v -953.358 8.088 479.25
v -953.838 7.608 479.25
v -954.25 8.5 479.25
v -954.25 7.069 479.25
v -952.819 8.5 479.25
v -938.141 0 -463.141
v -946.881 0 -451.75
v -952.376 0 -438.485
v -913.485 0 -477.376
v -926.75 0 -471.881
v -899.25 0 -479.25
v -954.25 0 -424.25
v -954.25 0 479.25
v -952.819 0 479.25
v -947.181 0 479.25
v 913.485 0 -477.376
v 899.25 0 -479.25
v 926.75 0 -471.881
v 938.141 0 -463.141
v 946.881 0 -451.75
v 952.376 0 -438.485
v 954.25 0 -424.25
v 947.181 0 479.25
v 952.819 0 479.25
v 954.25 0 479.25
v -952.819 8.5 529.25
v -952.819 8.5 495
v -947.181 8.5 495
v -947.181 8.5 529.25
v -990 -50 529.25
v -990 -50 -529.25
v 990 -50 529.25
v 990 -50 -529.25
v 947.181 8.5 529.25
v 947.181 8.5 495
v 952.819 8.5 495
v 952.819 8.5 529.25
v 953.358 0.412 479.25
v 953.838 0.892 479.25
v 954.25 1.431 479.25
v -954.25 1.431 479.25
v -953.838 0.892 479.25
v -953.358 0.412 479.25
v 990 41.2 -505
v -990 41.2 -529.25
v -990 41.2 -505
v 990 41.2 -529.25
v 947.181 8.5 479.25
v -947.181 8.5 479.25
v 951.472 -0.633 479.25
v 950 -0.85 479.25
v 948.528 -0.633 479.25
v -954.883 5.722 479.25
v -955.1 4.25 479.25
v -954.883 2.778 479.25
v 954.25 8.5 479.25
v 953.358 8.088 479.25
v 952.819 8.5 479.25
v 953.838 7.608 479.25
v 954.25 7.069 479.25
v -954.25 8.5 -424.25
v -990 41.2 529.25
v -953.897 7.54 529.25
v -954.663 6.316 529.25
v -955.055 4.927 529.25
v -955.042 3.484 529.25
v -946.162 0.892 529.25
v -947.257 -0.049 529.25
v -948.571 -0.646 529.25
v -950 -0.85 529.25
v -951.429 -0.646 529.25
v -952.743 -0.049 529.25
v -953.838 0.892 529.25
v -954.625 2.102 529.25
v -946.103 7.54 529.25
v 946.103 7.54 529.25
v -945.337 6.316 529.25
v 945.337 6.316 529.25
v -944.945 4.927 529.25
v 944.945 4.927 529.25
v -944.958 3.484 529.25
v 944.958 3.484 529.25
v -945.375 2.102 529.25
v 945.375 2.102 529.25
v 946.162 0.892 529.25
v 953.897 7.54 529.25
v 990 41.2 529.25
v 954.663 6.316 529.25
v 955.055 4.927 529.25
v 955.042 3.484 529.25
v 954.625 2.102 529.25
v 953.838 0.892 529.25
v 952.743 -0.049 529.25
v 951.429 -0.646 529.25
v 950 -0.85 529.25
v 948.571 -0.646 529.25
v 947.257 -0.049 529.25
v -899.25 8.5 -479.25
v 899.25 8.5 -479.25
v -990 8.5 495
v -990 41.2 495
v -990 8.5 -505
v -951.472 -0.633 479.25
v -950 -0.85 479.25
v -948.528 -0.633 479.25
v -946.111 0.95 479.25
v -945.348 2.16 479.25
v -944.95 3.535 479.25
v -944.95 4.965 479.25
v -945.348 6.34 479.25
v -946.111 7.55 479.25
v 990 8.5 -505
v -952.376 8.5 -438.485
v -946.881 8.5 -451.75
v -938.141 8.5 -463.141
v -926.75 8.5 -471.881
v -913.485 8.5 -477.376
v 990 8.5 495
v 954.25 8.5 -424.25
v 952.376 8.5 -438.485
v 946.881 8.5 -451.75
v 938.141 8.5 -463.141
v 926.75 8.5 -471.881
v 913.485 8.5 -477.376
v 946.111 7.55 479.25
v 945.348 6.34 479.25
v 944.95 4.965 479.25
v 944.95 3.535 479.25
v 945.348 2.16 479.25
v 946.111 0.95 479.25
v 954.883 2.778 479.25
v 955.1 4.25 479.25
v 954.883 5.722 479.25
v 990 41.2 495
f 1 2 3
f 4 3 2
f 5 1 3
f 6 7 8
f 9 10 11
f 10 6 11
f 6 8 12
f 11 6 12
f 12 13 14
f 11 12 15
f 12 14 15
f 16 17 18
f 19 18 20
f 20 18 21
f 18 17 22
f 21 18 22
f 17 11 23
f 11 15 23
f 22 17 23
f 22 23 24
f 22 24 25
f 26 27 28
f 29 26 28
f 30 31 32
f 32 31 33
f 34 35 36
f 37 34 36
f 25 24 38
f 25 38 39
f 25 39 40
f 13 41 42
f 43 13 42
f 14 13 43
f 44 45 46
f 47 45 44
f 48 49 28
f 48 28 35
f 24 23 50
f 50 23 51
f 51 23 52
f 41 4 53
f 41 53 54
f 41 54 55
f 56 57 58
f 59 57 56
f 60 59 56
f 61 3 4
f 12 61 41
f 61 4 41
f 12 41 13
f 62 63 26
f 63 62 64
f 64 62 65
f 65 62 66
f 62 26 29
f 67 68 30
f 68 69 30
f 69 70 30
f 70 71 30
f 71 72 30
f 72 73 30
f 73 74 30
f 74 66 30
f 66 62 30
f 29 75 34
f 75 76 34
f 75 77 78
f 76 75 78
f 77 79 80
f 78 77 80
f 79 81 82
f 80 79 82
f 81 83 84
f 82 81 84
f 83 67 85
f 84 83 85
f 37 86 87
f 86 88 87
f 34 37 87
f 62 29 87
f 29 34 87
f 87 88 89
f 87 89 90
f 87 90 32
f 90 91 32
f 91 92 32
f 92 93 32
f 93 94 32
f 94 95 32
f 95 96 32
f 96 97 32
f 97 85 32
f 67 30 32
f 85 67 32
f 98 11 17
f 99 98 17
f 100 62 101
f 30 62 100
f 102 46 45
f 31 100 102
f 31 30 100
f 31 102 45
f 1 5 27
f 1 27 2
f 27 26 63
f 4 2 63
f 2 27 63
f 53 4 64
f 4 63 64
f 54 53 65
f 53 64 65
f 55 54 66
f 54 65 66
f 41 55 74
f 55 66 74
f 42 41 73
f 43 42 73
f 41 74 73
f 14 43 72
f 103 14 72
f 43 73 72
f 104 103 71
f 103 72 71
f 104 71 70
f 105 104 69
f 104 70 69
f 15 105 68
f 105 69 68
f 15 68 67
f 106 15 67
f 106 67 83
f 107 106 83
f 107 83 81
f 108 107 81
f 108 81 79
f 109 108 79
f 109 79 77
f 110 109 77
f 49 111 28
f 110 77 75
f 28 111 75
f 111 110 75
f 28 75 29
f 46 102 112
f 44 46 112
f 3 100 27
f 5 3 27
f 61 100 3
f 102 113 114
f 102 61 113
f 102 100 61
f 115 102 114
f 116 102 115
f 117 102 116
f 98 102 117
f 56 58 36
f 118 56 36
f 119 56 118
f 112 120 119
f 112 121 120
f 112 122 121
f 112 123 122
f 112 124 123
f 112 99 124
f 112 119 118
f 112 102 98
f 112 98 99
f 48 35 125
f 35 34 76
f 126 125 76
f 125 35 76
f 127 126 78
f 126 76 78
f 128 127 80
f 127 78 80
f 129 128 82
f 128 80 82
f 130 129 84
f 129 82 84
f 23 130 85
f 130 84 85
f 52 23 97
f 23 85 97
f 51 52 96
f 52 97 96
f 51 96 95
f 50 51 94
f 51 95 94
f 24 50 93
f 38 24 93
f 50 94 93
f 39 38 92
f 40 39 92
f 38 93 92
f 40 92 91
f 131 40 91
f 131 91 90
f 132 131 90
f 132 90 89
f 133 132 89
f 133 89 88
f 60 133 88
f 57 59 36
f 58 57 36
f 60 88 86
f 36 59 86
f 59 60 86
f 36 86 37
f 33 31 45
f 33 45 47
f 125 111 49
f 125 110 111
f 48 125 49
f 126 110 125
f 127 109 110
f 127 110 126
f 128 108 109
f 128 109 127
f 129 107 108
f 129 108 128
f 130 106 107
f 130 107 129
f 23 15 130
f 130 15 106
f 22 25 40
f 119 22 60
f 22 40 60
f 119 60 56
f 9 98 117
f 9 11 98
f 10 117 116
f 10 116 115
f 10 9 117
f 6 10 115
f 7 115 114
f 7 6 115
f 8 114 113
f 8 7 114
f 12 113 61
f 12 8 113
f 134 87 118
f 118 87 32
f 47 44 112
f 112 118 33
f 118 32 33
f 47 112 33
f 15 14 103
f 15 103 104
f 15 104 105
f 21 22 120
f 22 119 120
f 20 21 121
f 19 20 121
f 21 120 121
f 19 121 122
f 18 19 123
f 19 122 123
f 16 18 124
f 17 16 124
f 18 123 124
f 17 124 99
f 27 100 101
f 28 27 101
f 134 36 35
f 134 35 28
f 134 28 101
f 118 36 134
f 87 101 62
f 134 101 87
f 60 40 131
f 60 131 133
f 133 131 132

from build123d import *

# Parameters (mm, degrees)
BOSS_EXTRUDE1_DEPTH = 479.25
BOSS_EXTRUDE2_START = -50
SKETCH3_W           = 1980
SKETCH3_H           = 50
BOSS_EXTRUDE2_DEPTH = 58.5
FILLET1_R           = 55
BOSS_EXTRUDE4_START = -50
SKETCH4_W           = 1980
SKETCH4_H           = 50
BOSS_EXTRUDE4_DEPTH = 58.5
CUT_EXTRUDE1_START  = 529.25
SKETCH7_R           = 5.1
CUT_EXTRUDE1_DEPTH  = 50
BOSS_EXTRUDE5_START = 8.5
SKETCH8_W           = 1980
SKETCH8_H           = 24.25
SKETCH8_H_2         = 34.25
BOSS_EXTRUDE5_DEPTH = 32.7


with BuildPart() as part:
    # Sketch2 → Boss-Extrude1 (new, symmetric)
    with BuildSketch(Plane.XY):
        Polygon((-954.25, 0), (954.25, 0), (954.25, 8.5), (990, 8.5), (990, -50), (-990, -50), (-990, 8.5), (-954.25, 8.5), align=None)
    extrude(amount=BOSS_EXTRUDE1_DEPTH, both=True)

    # Sketch3 → Boss-Extrude2 (add)
    with BuildSketch(Plane(origin=(0, 0, 0), x_dir=(1, 0, 0), z_dir=(0, 1, 0)).offset(BOSS_EXTRUDE2_START)):
        with Locations((0, 504.25)):
            Rectangle(SKETCH3_W, SKETCH3_H)
    extrude(amount=BOSS_EXTRUDE2_DEPTH)

    # Fillet1
    fillet1_edges = [part.edges().sort_by_distance(p)[0] for p in [
        (954.25, 4.25, -479.25),
        (-954.25, 4.25, -479.25),
    ]]
    fillet(fillet1_edges, radius=FILLET1_R)

    # Sketch4 → Boss-Extrude4 (add)
    with BuildSketch(Plane(origin=(0, 0, 0), x_dir=(1, 0, 0), z_dir=(0, 1, 0)).offset(BOSS_EXTRUDE4_START)):
        with Locations((0, -504.25)):
            Rectangle(SKETCH4_W, SKETCH4_H)
    extrude(amount=BOSS_EXTRUDE4_DEPTH)

    # Sketch7 → Cut-Extrude1 (cut)
    with BuildSketch(Plane.XY.offset(CUT_EXTRUDE1_START)):
        with Locations((-950, 4.25)):
            Circle(SKETCH7_R)
        with Locations((950, 4.25)):
            Circle(SKETCH7_R)
    extrude(amount=-CUT_EXTRUDE1_DEPTH, mode=Mode.SUBTRACT)

    # Sketch8 → Boss-Extrude5 (add)
    with BuildSketch(Plane(origin=(0, 0, 0), x_dir=(1, 0, 0), z_dir=(0, 1, 0)).offset(BOSS_EXTRUDE5_START)):
        with Locations((0, 517.125)):
            Rectangle(SKETCH8_W, SKETCH8_H)
        with Locations((0, -512.125)):
            Rectangle(SKETCH8_W, SKETCH8_H_2)
    extrude(amount=BOSS_EXTRUDE5_DEPTH)


solid = part.part
